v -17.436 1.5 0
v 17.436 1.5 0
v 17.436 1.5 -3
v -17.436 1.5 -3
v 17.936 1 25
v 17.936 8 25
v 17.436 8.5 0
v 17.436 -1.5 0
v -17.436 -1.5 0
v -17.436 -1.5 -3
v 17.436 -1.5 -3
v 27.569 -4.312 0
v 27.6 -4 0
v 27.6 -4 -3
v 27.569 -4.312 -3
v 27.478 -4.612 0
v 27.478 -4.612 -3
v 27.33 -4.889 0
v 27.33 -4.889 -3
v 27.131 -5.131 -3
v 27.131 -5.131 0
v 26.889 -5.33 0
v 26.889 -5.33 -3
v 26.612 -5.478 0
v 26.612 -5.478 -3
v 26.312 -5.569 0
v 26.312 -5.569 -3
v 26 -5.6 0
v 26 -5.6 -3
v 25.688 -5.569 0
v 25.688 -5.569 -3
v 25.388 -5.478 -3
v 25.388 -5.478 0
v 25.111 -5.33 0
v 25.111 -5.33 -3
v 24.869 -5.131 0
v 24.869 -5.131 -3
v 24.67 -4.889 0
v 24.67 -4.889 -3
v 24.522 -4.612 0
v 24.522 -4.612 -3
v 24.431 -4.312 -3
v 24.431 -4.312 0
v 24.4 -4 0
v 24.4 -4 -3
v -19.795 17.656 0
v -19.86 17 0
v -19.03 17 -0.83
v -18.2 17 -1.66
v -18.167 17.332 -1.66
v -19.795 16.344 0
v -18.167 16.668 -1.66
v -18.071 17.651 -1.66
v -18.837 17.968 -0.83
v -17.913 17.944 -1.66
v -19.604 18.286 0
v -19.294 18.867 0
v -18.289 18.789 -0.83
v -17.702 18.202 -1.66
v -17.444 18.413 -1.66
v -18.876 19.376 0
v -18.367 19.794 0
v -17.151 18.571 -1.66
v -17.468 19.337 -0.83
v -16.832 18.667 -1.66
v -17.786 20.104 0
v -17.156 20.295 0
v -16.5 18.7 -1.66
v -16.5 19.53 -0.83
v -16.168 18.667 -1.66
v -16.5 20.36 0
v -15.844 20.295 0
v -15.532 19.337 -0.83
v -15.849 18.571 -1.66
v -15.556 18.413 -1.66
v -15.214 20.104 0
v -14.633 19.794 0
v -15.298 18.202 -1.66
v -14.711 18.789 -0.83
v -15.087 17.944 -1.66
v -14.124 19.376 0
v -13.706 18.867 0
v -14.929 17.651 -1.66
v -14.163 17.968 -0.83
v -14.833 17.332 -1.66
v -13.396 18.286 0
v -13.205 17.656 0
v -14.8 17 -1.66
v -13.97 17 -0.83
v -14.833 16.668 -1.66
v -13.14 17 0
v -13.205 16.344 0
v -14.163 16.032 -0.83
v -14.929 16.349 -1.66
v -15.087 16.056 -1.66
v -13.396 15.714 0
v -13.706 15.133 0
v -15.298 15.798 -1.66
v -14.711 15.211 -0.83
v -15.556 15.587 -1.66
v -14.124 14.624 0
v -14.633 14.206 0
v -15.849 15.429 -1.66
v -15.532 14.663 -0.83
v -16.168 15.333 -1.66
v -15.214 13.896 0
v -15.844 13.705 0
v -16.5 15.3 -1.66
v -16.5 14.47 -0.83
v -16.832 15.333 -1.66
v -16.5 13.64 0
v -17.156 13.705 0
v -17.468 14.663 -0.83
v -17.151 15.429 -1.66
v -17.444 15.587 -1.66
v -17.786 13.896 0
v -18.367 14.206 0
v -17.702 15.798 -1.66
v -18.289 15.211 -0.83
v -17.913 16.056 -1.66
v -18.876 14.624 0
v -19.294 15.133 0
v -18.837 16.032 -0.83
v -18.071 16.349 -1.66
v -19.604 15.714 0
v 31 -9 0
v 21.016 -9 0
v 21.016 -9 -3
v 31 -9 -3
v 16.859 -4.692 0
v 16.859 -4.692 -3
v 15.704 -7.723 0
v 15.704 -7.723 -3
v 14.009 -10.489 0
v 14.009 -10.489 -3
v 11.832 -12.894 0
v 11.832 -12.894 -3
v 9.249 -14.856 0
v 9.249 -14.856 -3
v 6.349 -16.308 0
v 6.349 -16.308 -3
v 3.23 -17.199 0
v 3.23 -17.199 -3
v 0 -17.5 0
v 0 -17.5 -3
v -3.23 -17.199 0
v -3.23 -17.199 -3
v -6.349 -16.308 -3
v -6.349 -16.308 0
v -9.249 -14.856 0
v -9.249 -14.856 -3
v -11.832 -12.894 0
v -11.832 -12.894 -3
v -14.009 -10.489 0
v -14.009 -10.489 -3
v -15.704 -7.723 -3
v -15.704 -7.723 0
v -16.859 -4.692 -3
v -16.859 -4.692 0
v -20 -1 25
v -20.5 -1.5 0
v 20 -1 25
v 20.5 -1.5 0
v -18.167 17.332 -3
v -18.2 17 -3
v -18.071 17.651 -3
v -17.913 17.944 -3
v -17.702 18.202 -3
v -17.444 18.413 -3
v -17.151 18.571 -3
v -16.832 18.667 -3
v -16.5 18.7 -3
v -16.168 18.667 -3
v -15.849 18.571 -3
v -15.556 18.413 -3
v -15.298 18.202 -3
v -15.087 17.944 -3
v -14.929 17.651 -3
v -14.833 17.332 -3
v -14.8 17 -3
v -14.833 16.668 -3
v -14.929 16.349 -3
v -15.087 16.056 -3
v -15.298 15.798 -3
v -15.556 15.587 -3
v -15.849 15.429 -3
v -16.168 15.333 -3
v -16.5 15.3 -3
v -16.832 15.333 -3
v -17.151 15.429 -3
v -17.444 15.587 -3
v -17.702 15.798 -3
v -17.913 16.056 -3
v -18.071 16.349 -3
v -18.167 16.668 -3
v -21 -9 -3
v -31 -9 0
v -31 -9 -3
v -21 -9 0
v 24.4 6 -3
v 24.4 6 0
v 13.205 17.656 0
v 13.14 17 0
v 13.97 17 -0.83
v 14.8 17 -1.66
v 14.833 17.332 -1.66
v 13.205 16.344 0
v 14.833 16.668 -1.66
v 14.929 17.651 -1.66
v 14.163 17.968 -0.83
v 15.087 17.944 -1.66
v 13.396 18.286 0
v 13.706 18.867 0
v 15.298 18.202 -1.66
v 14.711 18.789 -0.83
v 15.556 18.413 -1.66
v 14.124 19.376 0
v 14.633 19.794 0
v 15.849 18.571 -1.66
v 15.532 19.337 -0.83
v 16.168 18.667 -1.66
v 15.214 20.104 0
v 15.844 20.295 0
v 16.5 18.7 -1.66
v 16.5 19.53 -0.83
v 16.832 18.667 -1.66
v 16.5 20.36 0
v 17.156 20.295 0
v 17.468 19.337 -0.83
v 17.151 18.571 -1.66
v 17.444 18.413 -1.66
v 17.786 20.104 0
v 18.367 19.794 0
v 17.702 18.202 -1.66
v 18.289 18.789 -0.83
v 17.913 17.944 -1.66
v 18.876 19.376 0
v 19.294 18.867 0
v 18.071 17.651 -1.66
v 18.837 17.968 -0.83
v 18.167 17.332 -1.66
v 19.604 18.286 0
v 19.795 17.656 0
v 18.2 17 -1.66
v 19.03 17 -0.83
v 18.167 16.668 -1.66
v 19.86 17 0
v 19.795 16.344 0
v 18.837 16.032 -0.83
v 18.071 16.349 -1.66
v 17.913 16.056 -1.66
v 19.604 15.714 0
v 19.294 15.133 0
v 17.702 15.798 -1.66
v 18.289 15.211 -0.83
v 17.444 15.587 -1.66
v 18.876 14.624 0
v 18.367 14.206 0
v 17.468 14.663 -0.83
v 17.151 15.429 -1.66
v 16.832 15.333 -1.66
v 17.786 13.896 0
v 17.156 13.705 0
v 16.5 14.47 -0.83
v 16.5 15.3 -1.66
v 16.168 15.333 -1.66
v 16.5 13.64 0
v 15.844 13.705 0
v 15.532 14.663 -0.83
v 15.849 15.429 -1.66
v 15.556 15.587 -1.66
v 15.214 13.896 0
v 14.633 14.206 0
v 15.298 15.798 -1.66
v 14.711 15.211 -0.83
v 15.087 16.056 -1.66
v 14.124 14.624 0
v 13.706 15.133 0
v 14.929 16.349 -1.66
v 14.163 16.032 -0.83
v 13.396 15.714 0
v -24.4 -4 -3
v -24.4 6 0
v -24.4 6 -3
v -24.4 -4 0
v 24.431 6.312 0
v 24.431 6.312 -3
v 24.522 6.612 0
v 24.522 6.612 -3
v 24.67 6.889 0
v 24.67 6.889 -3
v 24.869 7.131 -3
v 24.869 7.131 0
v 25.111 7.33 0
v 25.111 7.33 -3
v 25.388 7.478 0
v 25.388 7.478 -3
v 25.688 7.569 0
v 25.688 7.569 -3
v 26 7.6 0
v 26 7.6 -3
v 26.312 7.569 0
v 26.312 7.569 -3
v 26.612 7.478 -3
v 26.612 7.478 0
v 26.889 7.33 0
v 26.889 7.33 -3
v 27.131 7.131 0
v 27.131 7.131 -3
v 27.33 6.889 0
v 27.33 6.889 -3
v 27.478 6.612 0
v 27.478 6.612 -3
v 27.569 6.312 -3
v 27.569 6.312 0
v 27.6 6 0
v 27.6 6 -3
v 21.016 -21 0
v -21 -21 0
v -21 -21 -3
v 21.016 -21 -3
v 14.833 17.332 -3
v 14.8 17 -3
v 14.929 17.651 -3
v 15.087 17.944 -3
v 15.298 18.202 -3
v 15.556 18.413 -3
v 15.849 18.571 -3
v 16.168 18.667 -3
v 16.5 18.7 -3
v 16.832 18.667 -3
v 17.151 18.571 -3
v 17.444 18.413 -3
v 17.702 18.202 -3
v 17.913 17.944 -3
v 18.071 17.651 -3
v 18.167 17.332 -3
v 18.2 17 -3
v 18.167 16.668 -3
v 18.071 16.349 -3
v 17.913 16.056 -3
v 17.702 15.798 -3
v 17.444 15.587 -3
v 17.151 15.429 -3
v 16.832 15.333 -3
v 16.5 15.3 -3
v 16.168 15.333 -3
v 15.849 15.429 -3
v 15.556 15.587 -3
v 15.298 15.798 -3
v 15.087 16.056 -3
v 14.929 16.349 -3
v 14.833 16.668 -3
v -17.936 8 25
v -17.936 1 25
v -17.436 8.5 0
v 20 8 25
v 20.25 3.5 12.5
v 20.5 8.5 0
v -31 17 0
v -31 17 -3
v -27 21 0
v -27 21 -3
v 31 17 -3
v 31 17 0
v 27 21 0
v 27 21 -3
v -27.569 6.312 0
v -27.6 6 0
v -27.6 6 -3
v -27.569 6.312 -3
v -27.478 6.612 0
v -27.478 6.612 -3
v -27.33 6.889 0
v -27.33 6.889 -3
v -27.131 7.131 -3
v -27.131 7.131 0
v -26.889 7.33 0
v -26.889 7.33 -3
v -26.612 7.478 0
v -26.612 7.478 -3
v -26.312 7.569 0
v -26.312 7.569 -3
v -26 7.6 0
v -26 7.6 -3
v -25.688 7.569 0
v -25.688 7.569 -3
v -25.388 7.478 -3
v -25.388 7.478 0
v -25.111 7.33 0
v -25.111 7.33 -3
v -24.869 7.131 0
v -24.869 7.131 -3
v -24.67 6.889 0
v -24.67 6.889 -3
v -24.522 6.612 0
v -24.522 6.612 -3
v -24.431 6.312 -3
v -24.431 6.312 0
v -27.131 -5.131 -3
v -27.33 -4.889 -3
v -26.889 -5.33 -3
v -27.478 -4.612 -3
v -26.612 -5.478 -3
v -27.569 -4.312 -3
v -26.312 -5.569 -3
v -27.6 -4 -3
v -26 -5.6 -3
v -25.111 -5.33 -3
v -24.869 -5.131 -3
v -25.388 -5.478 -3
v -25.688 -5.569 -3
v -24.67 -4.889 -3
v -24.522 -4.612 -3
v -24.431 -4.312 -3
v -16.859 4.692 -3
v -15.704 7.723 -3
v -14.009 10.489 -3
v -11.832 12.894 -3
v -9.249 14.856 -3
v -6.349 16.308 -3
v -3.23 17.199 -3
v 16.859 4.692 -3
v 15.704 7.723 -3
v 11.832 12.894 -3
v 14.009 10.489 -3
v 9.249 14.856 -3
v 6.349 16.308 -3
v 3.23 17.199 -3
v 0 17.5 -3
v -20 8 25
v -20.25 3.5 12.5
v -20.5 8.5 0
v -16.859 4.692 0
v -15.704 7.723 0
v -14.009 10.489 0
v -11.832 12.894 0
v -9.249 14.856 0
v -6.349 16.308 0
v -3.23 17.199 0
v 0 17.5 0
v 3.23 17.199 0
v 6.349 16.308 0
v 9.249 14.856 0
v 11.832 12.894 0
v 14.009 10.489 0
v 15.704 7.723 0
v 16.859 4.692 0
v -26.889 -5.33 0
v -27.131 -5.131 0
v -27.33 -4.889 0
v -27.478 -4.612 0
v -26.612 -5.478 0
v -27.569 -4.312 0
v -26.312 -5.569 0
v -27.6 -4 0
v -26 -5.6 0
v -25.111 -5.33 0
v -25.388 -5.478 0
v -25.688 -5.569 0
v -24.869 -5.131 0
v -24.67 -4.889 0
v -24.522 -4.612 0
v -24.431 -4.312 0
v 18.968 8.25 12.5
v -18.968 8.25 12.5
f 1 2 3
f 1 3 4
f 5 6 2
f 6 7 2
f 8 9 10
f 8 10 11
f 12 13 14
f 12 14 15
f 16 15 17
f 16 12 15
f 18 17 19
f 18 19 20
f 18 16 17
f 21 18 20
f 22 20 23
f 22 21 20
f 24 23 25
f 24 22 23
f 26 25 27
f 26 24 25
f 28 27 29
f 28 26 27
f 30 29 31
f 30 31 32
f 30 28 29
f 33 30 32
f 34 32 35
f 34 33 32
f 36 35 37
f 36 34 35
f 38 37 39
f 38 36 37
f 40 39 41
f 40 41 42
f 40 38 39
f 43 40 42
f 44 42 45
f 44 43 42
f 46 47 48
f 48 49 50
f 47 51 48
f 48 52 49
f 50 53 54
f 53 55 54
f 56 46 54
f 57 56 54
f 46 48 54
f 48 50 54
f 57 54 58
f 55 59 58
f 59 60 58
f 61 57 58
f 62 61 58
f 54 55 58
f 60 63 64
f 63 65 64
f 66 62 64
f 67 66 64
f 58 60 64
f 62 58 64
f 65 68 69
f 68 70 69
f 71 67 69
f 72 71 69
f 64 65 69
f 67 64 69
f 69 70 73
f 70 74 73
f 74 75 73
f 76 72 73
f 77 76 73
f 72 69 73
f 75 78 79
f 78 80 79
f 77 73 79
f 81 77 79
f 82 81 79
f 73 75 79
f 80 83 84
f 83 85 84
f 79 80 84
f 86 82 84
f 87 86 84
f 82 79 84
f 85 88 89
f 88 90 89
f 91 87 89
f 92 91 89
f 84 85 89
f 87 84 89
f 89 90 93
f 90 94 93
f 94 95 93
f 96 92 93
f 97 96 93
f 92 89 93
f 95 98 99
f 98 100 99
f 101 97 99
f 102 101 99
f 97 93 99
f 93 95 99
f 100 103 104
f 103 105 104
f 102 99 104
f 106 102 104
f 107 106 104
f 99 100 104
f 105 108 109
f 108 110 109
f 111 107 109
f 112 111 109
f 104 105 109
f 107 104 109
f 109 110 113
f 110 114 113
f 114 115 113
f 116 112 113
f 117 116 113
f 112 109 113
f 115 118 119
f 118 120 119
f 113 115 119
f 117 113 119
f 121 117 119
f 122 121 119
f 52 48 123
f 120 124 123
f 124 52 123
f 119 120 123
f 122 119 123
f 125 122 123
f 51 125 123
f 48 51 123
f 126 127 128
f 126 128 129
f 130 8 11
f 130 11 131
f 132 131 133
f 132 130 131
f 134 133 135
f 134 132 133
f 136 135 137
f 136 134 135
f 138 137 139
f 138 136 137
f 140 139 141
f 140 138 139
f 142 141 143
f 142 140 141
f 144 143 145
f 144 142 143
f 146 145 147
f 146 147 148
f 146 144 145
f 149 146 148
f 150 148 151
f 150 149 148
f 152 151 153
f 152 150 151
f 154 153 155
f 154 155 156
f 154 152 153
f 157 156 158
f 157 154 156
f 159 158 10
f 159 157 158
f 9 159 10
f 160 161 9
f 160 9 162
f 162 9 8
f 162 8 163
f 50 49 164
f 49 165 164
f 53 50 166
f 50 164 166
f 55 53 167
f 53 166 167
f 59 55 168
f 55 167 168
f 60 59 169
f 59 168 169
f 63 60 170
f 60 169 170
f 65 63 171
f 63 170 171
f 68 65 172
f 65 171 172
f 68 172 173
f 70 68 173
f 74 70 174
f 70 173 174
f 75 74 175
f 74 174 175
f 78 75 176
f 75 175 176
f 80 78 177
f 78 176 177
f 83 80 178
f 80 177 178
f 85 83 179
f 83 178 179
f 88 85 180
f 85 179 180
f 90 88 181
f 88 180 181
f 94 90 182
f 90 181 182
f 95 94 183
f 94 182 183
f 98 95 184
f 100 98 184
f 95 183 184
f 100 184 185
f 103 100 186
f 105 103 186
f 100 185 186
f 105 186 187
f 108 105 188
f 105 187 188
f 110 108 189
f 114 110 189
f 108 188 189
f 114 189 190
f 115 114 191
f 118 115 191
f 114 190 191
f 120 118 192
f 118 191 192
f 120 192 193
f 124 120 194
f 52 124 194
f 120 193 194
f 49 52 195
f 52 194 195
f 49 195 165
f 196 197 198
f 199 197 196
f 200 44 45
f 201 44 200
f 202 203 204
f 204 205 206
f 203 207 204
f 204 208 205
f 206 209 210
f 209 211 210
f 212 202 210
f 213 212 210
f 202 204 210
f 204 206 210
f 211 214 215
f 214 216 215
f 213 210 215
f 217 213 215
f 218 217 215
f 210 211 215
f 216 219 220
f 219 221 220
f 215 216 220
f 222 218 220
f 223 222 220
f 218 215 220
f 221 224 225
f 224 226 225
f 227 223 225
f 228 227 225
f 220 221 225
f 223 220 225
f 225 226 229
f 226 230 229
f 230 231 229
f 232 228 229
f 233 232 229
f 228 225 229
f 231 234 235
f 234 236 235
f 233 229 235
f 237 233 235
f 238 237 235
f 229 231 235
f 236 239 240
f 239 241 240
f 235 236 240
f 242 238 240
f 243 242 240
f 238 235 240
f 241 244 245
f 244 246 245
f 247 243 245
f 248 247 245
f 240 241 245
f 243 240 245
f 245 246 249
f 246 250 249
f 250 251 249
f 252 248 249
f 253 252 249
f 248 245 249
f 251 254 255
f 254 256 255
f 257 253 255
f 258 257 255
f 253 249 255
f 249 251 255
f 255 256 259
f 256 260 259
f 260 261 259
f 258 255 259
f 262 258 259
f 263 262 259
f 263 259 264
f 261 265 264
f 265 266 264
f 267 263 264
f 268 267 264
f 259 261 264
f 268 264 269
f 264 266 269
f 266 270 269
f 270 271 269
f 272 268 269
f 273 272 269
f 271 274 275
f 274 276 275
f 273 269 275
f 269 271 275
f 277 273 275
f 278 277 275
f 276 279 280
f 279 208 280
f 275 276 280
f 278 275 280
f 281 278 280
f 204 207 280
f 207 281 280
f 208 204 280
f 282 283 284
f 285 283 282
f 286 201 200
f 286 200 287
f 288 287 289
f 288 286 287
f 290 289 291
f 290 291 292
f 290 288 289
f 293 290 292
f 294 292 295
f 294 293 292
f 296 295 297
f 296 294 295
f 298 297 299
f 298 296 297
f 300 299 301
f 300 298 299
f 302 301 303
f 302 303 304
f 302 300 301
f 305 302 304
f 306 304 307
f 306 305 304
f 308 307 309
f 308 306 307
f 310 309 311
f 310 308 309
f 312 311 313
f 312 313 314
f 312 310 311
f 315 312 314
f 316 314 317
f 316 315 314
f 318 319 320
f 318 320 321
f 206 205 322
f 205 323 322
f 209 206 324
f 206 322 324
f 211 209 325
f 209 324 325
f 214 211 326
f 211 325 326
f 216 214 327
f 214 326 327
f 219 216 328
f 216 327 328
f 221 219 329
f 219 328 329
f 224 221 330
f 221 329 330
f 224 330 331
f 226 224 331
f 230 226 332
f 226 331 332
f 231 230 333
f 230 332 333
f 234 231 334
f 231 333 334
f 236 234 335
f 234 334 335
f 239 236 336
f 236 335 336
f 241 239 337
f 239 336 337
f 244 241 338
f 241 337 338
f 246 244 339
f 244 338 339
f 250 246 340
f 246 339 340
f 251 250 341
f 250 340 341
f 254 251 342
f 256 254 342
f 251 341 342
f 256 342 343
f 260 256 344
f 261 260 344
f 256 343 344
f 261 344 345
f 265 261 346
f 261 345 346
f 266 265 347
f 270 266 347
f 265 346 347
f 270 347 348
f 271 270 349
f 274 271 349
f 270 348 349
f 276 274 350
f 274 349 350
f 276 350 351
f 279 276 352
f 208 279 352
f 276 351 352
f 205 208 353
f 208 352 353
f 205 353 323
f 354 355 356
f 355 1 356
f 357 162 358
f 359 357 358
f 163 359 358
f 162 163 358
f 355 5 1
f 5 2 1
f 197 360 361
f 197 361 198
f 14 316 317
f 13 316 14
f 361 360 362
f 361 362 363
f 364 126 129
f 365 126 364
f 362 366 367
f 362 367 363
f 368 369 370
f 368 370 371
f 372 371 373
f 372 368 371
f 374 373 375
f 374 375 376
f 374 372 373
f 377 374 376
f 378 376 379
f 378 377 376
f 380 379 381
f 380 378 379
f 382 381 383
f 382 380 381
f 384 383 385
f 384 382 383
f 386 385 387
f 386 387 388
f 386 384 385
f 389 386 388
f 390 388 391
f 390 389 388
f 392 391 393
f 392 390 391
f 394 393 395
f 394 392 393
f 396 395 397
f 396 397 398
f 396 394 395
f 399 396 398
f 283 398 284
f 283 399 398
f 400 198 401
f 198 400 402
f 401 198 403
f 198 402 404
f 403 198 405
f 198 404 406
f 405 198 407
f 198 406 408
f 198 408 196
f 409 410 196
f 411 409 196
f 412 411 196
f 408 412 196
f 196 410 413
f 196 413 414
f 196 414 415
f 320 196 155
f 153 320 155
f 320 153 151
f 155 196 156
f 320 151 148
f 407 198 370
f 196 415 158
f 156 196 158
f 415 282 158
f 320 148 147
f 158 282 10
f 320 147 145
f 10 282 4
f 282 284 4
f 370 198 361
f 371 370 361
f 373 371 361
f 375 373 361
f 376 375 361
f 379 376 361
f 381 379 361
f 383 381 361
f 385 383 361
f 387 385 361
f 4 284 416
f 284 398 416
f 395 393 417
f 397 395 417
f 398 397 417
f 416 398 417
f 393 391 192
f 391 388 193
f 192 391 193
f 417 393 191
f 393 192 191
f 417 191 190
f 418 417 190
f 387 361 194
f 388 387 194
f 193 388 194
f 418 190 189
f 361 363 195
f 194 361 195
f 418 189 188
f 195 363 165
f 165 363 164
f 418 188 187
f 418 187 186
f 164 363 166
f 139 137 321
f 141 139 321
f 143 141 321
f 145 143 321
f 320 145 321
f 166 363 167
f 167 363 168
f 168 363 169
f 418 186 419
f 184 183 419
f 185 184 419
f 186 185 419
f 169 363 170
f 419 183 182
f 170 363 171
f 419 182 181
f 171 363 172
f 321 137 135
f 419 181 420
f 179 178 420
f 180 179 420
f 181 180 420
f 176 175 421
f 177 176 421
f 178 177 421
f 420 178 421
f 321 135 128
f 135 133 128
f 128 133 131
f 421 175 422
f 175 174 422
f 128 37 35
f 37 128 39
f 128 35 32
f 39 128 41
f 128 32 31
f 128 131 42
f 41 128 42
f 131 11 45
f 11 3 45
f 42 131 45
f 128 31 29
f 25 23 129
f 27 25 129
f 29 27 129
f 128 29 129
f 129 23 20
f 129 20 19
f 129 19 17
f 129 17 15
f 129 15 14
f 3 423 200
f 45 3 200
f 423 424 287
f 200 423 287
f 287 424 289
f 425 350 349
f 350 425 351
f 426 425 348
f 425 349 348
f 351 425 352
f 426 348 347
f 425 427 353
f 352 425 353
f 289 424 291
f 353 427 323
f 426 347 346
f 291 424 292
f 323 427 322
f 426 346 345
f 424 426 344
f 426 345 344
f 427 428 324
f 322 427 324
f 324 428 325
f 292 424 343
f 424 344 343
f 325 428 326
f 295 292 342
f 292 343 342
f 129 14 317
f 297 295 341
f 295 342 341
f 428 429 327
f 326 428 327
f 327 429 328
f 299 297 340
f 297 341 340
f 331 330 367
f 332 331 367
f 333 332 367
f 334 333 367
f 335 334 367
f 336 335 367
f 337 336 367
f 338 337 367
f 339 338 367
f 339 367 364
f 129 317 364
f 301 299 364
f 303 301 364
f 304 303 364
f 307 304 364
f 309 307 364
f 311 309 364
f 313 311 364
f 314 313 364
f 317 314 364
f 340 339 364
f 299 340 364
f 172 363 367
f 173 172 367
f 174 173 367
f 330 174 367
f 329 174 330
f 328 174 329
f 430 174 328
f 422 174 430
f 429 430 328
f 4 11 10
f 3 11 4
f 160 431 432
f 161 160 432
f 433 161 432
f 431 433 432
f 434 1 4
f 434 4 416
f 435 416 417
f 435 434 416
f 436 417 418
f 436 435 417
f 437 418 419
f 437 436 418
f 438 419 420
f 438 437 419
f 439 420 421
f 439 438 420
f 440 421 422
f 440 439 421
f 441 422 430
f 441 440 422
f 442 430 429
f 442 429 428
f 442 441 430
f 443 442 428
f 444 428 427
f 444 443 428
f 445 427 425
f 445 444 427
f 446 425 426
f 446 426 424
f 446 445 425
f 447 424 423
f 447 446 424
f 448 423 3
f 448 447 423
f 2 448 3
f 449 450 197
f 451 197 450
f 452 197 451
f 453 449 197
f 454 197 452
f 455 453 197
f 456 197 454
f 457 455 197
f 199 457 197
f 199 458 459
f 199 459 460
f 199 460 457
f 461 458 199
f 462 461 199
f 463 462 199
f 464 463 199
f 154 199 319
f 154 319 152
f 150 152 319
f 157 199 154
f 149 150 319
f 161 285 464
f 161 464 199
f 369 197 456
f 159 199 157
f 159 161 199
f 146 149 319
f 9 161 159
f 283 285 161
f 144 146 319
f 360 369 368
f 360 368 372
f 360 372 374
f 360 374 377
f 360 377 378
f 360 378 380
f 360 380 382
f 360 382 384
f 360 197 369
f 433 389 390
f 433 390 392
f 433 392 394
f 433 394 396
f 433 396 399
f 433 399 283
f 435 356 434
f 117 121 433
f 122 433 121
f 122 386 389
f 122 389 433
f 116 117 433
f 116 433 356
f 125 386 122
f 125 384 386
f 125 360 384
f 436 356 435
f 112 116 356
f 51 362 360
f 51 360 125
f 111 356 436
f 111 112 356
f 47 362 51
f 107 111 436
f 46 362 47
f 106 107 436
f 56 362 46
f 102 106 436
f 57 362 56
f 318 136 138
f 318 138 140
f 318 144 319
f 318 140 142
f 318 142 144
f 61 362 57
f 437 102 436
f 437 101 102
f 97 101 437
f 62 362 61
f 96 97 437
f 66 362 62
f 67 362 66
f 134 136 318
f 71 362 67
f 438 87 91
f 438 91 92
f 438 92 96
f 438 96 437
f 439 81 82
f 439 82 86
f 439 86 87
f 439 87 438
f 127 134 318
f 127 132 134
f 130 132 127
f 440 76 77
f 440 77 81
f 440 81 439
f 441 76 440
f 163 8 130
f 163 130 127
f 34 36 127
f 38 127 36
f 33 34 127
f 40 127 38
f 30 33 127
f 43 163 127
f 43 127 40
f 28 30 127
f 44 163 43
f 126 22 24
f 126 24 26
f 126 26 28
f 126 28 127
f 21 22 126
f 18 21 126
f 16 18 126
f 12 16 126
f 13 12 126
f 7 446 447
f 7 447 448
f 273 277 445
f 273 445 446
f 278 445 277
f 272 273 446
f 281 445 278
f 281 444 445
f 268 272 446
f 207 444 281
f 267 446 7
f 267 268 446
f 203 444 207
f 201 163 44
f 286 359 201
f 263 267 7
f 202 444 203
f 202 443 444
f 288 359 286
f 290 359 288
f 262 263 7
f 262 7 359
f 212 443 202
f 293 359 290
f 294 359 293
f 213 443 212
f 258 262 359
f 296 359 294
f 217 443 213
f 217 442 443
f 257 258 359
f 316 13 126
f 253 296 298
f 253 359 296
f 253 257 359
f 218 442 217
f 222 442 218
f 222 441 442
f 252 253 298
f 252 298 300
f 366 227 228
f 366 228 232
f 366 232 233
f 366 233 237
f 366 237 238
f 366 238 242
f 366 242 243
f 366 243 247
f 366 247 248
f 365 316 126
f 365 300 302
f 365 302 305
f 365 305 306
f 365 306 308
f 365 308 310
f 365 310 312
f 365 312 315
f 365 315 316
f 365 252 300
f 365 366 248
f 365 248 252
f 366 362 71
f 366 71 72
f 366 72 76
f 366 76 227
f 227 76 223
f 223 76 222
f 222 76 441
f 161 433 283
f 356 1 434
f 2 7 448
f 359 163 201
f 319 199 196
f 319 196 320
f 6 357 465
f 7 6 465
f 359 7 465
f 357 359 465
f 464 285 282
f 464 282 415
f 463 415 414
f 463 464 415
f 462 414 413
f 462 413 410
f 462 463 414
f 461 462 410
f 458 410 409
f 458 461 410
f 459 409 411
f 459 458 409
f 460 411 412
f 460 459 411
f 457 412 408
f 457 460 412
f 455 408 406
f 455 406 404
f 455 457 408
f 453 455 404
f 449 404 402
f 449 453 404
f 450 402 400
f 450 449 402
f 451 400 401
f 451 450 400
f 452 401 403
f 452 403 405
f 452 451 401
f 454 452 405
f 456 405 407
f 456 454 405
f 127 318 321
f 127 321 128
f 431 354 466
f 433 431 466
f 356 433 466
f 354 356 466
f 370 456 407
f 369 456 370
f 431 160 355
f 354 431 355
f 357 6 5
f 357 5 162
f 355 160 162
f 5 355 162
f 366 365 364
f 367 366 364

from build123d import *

# Parameters (mm, degrees)
F1_DEPTH       = 3
F2_D           = 3.4
F2_CSINK_D     = 6.72
F2_CSINK_ANGLE = 90
F3_SIZE        = 4


with BuildPart() as f1:
    # F0 (on Top) → F1 (new body)
    with BuildSketch(Plane.XY):
        Polygon((31, 21), (-31, 21), (-31, -9), (-21, -9), (-21, -21), (21.0163556039, -21), (21.0163556039, -9), (31, -9), align=None)
        with BuildLine():
            ThreePointArc((17.4355957742, -1.5), (0, -17.5), (-17.4355957742, -1.5))
            Line((-17.4355957742, -1.5), (17.4355957742, -1.5))
        make_face(mode=Mode.SUBTRACT)
        with BuildLine():
            ThreePointArc((-24.4, -4), (-26, -5.6), (-27.6, -4))
            Line((-27.6, -4), (-27.6, 6))
            ThreePointArc((-27.6, 6), (-26, 7.6), (-24.4, 6))
            Line((-24.4, 6), (-24.4, -4))
        make_face(mode=Mode.SUBTRACT)
        with BuildLine():
            Line((17.4355957742, 1.5), (-17.4355957742, 1.5))
            ThreePointArc((-17.4355957742, 1.5), (0, 17.5), (17.4355957742, 1.5))
        make_face(mode=Mode.SUBTRACT)
        with BuildLine():
            ThreePointArc((27.6, -4), (26, -5.6), (24.4, -4))
            Line((24.4, -4), (24.4, 6))
            ThreePointArc((24.4, 6), (26, 7.6), (27.6, 6))
            Line((27.6, 6), (27.6, -4))
        make_face(mode=Mode.SUBTRACT)
    extrude(amount=-F1_DEPTH)

    # F2 (through all)
    with Locations(Plane.XY):
        with Locations((-16.5, 17), (16.5, 17)):
            CounterSinkHole(F2_D / 2, F2_CSINK_D / 2, counter_sink_angle=F2_CSINK_ANGLE)

    # F3
    f3_edges = [f1.edges().sort_by_distance(p)[0] for p in [
        (31, 21, -1.5),
        (-31, 21, -1.5),
    ]]
    chamfer(f3_edges, length=F3_SIZE)

    # F6 (on offset) → F7 section 0
    with BuildSketch(Plane.XY.offset(25)):
        Polygon((-17.9355957742, 1), (-17.9355957742, 8), (-20, 8), (-20, -1), (-17.4355957742, -1), (17.4355957742, -1), (20, -1), (20, 8), (17.9355957742, 8), (17.9355957742, 1), align=None)
    # F4 (on face) → F7 section 1
    with BuildSketch(Plane.XY):
        Polygon((17.4355957742, 1.5), (-17.4355957742, 1.5), (-17.4355957742, 8.5), (-20.5, 8.5), (-20.5, -1.5), (-17.4355957742, -1.5), (17.4355957742, -1.5), (20.5, -1.5), (20.5, 8.5), (17.4355957742, 8.5), align=None)
    loft()


solid = f1.part
